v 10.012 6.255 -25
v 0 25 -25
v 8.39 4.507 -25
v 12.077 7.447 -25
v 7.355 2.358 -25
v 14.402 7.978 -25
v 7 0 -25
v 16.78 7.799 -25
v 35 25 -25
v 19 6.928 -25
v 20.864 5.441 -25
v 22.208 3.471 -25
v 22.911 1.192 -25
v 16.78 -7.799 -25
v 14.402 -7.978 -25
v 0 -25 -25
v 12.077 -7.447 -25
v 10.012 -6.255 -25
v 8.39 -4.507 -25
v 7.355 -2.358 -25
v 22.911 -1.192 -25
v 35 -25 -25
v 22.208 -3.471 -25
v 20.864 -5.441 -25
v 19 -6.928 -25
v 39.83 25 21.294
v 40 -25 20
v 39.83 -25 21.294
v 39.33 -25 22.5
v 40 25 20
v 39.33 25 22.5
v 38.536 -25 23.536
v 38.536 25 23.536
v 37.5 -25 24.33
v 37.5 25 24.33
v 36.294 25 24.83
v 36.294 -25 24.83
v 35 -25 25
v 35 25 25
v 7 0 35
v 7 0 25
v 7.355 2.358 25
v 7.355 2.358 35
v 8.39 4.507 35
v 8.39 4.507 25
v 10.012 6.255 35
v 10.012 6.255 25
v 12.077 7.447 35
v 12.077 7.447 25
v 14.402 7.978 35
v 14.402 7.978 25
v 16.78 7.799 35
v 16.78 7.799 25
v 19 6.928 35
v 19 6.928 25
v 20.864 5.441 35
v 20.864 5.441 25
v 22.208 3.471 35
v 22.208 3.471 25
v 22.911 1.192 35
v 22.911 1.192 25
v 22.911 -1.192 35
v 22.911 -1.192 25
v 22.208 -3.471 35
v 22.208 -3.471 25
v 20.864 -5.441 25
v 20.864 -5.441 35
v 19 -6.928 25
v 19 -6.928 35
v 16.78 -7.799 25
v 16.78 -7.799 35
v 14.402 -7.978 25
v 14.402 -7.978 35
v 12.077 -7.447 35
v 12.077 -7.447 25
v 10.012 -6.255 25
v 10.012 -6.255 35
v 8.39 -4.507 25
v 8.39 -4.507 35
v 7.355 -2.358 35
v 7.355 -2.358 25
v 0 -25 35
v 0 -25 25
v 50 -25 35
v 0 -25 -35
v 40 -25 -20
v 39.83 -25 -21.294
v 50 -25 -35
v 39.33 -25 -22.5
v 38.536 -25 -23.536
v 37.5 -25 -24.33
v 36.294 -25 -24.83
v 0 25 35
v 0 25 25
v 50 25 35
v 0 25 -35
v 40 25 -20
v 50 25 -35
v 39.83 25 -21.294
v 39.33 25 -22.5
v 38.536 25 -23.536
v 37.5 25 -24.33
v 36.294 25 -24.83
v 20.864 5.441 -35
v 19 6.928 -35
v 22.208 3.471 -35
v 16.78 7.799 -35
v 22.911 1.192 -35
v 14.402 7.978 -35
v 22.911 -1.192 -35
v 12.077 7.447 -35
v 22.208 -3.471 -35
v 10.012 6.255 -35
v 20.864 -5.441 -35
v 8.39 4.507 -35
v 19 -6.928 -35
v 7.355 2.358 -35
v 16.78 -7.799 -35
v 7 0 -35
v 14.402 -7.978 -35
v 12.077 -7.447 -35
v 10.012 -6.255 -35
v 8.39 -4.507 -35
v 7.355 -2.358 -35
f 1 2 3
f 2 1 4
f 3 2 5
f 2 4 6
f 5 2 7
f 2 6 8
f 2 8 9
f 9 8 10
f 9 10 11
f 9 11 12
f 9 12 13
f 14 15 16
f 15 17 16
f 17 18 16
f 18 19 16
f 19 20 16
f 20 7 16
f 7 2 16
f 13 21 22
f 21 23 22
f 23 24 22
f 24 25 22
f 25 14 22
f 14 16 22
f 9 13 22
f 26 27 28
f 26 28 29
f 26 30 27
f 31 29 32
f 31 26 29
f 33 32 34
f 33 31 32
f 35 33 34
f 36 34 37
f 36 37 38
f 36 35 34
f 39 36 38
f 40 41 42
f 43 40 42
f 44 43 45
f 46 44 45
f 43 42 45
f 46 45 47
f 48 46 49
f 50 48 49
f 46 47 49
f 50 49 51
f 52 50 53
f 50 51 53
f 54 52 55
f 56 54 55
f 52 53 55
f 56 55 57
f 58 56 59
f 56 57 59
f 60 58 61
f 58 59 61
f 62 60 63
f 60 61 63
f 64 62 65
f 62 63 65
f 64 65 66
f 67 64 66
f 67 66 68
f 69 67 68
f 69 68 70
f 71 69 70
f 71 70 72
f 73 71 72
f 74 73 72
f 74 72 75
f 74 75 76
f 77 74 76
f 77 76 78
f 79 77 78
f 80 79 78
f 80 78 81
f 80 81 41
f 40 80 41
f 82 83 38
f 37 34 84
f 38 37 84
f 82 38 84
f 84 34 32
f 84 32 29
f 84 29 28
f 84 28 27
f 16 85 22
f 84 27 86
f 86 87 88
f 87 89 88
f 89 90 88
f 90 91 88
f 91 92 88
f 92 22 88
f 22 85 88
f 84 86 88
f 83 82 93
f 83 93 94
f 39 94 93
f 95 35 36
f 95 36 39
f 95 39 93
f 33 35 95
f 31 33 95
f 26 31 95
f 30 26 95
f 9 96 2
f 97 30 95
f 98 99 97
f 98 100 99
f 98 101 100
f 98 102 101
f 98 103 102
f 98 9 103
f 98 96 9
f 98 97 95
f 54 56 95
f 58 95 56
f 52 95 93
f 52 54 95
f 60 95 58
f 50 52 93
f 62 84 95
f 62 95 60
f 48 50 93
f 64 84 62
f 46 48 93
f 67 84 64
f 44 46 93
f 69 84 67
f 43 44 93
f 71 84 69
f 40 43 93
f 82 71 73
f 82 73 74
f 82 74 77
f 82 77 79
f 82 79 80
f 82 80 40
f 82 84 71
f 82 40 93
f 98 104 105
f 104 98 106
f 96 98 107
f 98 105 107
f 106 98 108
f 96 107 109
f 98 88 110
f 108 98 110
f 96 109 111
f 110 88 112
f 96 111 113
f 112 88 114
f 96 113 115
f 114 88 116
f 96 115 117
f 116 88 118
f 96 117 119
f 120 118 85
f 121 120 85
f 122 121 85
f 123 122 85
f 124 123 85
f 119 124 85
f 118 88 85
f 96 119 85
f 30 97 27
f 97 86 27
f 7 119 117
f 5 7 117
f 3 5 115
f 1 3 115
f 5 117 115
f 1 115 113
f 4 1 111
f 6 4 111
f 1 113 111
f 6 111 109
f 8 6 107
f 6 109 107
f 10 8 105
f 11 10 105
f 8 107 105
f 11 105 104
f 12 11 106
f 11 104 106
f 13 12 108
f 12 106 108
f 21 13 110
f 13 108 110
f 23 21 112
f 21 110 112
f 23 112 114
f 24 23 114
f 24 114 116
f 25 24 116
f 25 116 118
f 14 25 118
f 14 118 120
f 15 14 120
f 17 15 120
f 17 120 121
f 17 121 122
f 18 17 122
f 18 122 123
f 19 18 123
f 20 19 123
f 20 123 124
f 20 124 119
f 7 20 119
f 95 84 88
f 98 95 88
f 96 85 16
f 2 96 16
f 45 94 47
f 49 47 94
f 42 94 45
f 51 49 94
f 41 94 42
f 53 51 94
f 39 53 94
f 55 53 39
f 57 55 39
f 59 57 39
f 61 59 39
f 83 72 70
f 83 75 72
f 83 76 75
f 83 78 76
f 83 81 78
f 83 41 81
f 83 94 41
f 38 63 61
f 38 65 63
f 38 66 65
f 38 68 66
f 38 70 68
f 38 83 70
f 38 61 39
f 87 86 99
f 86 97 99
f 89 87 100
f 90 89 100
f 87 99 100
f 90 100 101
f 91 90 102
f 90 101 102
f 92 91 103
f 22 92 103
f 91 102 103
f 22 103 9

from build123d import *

# Parameters (mm, degrees)
F1_DEPTH = 25
F4_D     = 16
F5_R     = 5


with BuildPart() as f1:
    # F0 (on Front) → F1 (new body, symmetric)
    with BuildSketch(Plane.XZ):
        Polygon((40, 0), (50, 0), (50, 35), (0, 35), (0, 25), (40, 25), align=None)
    extrude(amount=F1_DEPTH, both=True)

    # F2: F1 across plane


with BuildPart() as f1_1:
    add(f1.part)
    add(f1.part.mirror(Plane.XY))

    # F4 (through all)
    with Locations(Plane.XY.offset(35)):
        with Locations((15, 0)):
            Hole(F4_D / 2)

    # F5
    f5_edges = [f1_1.edges().sort_by_distance(p)[0] for p in [
        (40, 0, 25),
        (40, 0, -25),
    ]]
    fillet(f5_edges, radius=F5_R)


solid = f1_1.part
